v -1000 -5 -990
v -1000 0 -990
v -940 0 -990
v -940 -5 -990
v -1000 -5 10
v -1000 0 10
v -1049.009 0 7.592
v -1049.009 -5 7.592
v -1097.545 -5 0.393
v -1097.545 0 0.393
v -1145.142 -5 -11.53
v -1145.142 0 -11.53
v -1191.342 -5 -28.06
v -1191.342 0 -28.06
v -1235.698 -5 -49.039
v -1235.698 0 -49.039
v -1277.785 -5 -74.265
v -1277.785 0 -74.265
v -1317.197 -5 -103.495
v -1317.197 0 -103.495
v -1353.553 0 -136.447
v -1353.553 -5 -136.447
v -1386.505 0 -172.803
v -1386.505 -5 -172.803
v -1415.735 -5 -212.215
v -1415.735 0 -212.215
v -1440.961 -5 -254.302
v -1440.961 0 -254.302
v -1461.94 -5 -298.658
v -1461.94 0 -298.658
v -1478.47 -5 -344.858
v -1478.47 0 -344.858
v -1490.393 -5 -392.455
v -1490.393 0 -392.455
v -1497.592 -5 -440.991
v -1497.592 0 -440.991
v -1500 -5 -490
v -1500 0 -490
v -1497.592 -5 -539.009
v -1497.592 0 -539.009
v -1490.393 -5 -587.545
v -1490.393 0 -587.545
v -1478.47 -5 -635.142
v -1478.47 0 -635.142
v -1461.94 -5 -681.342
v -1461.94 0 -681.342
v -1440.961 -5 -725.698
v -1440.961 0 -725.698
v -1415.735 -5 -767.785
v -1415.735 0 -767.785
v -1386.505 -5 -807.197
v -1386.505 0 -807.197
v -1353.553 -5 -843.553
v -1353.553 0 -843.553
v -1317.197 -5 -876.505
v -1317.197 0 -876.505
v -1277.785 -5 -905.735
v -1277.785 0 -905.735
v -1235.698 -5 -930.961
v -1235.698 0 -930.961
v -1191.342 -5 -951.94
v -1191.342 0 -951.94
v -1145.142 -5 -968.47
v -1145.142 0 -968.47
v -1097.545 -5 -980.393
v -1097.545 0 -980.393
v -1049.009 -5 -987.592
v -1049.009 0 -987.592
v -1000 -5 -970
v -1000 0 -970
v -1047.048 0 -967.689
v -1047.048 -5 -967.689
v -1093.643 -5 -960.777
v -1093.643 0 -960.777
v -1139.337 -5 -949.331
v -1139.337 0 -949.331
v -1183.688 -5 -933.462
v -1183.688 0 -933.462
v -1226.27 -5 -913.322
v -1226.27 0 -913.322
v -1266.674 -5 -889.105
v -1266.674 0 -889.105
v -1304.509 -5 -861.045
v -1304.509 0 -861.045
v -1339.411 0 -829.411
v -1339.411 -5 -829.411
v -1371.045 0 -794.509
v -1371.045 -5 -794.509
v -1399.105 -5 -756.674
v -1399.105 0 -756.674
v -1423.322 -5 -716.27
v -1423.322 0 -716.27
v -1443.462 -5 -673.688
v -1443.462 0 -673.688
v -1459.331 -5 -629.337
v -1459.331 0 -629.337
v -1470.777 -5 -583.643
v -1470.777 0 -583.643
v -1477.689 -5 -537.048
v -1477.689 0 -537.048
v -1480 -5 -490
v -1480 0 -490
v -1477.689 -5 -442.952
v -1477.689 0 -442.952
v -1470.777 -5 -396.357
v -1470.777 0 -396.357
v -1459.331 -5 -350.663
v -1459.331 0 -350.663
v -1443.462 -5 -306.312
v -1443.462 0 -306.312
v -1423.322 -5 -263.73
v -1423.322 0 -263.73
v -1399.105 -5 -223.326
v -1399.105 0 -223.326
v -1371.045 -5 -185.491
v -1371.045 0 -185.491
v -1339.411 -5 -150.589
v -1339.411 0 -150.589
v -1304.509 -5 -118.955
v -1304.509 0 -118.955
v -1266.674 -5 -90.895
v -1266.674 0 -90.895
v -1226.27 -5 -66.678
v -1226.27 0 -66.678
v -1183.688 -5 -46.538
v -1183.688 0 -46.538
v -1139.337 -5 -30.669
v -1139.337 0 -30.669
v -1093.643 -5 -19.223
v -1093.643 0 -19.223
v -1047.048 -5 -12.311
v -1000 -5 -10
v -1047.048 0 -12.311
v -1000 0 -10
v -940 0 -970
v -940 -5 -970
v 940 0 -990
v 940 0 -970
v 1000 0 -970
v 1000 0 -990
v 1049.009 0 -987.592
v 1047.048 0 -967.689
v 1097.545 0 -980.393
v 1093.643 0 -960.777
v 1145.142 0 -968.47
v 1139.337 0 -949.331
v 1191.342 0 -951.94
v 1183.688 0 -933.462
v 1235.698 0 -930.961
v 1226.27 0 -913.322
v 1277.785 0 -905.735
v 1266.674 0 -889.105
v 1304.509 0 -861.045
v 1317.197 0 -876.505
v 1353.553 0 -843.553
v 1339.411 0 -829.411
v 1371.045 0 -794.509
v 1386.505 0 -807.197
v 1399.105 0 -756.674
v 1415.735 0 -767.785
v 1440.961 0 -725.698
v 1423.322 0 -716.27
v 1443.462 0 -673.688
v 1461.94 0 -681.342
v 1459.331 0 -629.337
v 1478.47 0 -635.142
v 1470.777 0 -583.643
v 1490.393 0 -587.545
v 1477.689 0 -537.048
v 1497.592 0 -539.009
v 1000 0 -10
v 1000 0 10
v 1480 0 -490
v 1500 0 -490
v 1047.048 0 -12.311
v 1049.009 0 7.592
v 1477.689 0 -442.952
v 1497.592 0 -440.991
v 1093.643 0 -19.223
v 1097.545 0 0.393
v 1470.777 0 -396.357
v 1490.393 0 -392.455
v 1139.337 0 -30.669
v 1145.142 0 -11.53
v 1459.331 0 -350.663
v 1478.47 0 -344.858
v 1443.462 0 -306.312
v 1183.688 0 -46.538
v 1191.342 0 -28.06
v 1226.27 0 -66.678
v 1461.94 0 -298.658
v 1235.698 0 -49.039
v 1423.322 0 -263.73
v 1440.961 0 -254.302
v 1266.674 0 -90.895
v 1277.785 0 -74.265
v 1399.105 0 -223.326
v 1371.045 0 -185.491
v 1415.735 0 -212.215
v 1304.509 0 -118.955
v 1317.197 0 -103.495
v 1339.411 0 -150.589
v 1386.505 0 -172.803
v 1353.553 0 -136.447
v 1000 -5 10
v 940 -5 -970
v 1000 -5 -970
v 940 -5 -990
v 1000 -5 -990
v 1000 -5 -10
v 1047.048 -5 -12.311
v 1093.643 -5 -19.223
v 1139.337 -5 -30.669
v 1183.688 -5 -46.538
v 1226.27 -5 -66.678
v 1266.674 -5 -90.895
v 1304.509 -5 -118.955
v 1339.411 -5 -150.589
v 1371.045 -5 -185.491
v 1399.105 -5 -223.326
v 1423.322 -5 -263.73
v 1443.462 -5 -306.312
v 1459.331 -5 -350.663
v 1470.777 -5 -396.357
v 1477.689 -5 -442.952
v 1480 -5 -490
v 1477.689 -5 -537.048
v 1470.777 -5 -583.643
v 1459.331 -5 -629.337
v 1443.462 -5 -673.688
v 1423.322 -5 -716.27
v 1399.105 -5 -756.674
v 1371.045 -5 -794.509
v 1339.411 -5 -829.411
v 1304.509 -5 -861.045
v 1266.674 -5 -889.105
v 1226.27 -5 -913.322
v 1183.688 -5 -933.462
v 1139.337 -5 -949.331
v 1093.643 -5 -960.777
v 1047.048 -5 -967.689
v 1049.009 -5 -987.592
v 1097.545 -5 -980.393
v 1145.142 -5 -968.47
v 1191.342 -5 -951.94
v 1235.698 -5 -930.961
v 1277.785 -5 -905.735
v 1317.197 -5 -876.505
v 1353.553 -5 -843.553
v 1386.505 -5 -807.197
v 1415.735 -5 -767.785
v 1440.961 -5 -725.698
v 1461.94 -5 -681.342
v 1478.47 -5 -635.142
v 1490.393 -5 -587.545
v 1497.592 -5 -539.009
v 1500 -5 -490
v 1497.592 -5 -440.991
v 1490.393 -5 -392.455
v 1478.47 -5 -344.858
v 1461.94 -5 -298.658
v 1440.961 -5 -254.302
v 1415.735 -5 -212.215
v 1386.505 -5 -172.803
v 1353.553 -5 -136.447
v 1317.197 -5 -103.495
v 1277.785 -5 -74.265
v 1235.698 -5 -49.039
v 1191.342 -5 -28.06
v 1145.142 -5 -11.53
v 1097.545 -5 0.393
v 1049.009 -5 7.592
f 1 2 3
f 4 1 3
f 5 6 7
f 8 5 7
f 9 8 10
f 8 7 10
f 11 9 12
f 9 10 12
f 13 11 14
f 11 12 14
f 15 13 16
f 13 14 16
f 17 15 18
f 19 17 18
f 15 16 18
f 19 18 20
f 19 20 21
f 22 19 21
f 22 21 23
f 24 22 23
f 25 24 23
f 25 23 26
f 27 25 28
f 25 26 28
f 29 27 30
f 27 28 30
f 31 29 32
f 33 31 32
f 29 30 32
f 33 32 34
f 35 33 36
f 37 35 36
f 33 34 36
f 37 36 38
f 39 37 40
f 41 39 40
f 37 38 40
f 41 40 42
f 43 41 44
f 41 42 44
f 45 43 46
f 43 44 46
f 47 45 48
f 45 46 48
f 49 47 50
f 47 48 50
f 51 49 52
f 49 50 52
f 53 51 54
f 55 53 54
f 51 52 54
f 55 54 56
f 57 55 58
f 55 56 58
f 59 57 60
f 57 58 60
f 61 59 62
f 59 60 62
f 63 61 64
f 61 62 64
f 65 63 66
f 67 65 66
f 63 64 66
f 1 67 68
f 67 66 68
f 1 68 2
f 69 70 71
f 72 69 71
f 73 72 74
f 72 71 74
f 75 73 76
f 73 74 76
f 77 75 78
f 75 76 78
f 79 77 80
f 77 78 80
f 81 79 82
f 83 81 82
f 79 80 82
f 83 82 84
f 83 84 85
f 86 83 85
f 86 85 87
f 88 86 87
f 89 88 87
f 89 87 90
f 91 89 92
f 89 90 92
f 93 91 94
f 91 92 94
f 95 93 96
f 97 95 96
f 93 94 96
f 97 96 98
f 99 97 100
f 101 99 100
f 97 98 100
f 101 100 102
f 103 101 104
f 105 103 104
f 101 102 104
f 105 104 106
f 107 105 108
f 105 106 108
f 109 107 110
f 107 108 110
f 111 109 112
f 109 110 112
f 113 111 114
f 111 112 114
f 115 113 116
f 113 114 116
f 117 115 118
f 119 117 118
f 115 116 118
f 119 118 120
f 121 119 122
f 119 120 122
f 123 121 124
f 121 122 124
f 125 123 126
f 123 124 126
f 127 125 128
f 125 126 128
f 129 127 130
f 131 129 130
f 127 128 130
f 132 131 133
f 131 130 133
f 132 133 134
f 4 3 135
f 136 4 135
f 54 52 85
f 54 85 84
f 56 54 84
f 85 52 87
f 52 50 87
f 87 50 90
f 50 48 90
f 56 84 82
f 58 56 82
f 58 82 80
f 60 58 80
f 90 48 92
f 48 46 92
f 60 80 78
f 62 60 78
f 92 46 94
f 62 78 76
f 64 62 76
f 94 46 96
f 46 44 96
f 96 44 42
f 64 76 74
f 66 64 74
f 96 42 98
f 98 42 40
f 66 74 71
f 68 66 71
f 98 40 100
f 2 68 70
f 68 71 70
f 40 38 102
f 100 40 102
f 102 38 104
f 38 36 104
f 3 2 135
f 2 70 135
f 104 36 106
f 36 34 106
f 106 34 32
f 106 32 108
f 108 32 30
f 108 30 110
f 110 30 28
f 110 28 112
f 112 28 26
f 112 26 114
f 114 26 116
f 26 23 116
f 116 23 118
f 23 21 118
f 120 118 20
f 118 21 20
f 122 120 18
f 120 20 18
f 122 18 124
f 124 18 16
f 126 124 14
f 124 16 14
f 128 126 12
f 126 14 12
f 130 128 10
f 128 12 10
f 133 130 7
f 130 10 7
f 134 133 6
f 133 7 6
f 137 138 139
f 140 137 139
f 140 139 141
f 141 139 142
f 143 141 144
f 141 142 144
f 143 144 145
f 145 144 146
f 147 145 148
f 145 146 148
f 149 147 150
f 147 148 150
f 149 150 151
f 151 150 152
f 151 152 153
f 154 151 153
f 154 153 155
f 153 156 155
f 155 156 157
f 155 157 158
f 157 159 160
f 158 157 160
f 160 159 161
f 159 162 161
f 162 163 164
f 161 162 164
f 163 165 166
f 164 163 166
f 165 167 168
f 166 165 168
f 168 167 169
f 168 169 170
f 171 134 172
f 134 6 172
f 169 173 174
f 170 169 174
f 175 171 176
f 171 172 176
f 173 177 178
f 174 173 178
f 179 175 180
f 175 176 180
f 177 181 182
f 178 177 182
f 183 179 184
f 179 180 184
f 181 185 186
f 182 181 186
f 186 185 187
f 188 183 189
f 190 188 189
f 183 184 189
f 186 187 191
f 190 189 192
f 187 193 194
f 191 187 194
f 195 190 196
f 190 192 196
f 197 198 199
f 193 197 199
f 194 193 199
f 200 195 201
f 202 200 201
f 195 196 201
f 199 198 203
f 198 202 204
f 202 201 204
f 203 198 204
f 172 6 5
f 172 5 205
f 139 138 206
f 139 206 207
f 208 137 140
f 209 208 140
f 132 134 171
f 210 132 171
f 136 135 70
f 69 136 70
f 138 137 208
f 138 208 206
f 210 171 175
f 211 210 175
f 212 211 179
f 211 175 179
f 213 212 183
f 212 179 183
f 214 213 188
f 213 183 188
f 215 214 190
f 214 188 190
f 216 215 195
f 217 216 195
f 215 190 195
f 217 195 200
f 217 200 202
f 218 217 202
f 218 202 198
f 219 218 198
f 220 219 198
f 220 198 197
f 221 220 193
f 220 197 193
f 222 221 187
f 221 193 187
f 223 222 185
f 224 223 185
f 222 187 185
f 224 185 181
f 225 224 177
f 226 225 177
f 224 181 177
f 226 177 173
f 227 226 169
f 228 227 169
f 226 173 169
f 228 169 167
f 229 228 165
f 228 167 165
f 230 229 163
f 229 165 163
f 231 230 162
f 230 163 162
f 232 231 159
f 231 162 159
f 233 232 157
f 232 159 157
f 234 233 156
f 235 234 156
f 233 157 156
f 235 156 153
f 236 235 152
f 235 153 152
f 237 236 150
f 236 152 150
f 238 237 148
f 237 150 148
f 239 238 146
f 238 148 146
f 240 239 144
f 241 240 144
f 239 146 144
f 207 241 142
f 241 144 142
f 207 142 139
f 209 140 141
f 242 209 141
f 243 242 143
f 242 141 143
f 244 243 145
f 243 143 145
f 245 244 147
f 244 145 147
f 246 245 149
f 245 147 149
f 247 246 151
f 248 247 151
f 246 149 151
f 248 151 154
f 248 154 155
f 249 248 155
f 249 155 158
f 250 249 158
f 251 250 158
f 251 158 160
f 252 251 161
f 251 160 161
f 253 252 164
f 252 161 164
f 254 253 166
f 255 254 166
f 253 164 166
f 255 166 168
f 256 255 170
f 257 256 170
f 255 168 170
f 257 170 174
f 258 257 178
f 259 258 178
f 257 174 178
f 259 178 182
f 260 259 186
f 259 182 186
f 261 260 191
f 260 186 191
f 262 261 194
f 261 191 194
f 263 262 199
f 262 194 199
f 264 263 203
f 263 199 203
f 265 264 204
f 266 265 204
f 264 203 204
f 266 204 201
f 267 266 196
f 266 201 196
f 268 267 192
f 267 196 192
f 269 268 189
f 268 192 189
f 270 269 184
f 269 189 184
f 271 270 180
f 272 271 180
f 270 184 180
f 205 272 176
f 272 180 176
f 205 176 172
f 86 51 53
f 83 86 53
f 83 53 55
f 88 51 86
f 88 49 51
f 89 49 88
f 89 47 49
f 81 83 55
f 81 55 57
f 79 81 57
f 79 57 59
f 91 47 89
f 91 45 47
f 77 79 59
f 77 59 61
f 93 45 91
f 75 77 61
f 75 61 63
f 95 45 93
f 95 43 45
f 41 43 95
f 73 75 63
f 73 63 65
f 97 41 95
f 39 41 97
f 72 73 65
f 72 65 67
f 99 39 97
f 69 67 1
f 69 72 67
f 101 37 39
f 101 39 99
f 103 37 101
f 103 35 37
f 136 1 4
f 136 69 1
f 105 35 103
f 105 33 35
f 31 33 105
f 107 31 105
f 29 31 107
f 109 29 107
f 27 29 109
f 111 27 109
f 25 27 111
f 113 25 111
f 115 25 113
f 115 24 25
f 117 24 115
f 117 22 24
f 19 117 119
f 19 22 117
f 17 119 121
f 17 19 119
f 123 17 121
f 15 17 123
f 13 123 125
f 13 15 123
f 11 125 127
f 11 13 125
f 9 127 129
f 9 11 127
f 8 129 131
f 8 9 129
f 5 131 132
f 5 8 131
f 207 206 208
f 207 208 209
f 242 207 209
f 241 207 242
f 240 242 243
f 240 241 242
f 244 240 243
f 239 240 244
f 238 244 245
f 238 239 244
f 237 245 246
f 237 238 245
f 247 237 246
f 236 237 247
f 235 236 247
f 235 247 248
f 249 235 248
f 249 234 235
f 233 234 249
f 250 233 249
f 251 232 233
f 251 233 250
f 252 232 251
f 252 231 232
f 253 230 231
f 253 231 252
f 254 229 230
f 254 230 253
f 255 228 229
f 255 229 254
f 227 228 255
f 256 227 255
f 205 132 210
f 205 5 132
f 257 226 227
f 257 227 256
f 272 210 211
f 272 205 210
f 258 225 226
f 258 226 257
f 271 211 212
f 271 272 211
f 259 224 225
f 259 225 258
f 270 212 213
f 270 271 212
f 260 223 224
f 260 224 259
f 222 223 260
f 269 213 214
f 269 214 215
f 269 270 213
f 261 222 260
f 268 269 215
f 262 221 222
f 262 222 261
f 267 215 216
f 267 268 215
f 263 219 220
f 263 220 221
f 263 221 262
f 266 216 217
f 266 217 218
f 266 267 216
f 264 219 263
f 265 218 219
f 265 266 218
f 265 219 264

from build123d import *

# Parameters (mm, degrees)
F0_W     = 2000
F0_H     = 20
F0_W_2   = 60
F1_DEPTH = 5


with BuildPart() as f1:
    # F0 (on Front) → F1 (new body)
    with BuildSketch(Plane.XZ):
        Rectangle(F0_W, F0_H)
        with BuildLine():
            Line((-1000, -10), (-1000, 10))
            ThreePointArc((-1000, 10), (-1500, -490), (-1000, -990))
            Line((-1000, -990), (-940, -990))
            Line((-940, -990), (-940, -970))
            Line((-940, -970), (-1000, -970))
            ThreePointArc((-1000, -970), (-1480, -490), (-1000, -10))
        make_face()
        with BuildLine():
            ThreePointArc((1000, -990), (1500, -490), (1000, 10))
            Line((1000, 10), (1000, -10))
            ThreePointArc((1000, -10), (1480, -490), (1000, -970))
            Line((1000, -970), (1000, -990))
        make_face()
        with Locations((970, -980)):
            Rectangle(F0_W_2, F0_H)
    extrude(amount=F1_DEPTH)


solid = f1.part
